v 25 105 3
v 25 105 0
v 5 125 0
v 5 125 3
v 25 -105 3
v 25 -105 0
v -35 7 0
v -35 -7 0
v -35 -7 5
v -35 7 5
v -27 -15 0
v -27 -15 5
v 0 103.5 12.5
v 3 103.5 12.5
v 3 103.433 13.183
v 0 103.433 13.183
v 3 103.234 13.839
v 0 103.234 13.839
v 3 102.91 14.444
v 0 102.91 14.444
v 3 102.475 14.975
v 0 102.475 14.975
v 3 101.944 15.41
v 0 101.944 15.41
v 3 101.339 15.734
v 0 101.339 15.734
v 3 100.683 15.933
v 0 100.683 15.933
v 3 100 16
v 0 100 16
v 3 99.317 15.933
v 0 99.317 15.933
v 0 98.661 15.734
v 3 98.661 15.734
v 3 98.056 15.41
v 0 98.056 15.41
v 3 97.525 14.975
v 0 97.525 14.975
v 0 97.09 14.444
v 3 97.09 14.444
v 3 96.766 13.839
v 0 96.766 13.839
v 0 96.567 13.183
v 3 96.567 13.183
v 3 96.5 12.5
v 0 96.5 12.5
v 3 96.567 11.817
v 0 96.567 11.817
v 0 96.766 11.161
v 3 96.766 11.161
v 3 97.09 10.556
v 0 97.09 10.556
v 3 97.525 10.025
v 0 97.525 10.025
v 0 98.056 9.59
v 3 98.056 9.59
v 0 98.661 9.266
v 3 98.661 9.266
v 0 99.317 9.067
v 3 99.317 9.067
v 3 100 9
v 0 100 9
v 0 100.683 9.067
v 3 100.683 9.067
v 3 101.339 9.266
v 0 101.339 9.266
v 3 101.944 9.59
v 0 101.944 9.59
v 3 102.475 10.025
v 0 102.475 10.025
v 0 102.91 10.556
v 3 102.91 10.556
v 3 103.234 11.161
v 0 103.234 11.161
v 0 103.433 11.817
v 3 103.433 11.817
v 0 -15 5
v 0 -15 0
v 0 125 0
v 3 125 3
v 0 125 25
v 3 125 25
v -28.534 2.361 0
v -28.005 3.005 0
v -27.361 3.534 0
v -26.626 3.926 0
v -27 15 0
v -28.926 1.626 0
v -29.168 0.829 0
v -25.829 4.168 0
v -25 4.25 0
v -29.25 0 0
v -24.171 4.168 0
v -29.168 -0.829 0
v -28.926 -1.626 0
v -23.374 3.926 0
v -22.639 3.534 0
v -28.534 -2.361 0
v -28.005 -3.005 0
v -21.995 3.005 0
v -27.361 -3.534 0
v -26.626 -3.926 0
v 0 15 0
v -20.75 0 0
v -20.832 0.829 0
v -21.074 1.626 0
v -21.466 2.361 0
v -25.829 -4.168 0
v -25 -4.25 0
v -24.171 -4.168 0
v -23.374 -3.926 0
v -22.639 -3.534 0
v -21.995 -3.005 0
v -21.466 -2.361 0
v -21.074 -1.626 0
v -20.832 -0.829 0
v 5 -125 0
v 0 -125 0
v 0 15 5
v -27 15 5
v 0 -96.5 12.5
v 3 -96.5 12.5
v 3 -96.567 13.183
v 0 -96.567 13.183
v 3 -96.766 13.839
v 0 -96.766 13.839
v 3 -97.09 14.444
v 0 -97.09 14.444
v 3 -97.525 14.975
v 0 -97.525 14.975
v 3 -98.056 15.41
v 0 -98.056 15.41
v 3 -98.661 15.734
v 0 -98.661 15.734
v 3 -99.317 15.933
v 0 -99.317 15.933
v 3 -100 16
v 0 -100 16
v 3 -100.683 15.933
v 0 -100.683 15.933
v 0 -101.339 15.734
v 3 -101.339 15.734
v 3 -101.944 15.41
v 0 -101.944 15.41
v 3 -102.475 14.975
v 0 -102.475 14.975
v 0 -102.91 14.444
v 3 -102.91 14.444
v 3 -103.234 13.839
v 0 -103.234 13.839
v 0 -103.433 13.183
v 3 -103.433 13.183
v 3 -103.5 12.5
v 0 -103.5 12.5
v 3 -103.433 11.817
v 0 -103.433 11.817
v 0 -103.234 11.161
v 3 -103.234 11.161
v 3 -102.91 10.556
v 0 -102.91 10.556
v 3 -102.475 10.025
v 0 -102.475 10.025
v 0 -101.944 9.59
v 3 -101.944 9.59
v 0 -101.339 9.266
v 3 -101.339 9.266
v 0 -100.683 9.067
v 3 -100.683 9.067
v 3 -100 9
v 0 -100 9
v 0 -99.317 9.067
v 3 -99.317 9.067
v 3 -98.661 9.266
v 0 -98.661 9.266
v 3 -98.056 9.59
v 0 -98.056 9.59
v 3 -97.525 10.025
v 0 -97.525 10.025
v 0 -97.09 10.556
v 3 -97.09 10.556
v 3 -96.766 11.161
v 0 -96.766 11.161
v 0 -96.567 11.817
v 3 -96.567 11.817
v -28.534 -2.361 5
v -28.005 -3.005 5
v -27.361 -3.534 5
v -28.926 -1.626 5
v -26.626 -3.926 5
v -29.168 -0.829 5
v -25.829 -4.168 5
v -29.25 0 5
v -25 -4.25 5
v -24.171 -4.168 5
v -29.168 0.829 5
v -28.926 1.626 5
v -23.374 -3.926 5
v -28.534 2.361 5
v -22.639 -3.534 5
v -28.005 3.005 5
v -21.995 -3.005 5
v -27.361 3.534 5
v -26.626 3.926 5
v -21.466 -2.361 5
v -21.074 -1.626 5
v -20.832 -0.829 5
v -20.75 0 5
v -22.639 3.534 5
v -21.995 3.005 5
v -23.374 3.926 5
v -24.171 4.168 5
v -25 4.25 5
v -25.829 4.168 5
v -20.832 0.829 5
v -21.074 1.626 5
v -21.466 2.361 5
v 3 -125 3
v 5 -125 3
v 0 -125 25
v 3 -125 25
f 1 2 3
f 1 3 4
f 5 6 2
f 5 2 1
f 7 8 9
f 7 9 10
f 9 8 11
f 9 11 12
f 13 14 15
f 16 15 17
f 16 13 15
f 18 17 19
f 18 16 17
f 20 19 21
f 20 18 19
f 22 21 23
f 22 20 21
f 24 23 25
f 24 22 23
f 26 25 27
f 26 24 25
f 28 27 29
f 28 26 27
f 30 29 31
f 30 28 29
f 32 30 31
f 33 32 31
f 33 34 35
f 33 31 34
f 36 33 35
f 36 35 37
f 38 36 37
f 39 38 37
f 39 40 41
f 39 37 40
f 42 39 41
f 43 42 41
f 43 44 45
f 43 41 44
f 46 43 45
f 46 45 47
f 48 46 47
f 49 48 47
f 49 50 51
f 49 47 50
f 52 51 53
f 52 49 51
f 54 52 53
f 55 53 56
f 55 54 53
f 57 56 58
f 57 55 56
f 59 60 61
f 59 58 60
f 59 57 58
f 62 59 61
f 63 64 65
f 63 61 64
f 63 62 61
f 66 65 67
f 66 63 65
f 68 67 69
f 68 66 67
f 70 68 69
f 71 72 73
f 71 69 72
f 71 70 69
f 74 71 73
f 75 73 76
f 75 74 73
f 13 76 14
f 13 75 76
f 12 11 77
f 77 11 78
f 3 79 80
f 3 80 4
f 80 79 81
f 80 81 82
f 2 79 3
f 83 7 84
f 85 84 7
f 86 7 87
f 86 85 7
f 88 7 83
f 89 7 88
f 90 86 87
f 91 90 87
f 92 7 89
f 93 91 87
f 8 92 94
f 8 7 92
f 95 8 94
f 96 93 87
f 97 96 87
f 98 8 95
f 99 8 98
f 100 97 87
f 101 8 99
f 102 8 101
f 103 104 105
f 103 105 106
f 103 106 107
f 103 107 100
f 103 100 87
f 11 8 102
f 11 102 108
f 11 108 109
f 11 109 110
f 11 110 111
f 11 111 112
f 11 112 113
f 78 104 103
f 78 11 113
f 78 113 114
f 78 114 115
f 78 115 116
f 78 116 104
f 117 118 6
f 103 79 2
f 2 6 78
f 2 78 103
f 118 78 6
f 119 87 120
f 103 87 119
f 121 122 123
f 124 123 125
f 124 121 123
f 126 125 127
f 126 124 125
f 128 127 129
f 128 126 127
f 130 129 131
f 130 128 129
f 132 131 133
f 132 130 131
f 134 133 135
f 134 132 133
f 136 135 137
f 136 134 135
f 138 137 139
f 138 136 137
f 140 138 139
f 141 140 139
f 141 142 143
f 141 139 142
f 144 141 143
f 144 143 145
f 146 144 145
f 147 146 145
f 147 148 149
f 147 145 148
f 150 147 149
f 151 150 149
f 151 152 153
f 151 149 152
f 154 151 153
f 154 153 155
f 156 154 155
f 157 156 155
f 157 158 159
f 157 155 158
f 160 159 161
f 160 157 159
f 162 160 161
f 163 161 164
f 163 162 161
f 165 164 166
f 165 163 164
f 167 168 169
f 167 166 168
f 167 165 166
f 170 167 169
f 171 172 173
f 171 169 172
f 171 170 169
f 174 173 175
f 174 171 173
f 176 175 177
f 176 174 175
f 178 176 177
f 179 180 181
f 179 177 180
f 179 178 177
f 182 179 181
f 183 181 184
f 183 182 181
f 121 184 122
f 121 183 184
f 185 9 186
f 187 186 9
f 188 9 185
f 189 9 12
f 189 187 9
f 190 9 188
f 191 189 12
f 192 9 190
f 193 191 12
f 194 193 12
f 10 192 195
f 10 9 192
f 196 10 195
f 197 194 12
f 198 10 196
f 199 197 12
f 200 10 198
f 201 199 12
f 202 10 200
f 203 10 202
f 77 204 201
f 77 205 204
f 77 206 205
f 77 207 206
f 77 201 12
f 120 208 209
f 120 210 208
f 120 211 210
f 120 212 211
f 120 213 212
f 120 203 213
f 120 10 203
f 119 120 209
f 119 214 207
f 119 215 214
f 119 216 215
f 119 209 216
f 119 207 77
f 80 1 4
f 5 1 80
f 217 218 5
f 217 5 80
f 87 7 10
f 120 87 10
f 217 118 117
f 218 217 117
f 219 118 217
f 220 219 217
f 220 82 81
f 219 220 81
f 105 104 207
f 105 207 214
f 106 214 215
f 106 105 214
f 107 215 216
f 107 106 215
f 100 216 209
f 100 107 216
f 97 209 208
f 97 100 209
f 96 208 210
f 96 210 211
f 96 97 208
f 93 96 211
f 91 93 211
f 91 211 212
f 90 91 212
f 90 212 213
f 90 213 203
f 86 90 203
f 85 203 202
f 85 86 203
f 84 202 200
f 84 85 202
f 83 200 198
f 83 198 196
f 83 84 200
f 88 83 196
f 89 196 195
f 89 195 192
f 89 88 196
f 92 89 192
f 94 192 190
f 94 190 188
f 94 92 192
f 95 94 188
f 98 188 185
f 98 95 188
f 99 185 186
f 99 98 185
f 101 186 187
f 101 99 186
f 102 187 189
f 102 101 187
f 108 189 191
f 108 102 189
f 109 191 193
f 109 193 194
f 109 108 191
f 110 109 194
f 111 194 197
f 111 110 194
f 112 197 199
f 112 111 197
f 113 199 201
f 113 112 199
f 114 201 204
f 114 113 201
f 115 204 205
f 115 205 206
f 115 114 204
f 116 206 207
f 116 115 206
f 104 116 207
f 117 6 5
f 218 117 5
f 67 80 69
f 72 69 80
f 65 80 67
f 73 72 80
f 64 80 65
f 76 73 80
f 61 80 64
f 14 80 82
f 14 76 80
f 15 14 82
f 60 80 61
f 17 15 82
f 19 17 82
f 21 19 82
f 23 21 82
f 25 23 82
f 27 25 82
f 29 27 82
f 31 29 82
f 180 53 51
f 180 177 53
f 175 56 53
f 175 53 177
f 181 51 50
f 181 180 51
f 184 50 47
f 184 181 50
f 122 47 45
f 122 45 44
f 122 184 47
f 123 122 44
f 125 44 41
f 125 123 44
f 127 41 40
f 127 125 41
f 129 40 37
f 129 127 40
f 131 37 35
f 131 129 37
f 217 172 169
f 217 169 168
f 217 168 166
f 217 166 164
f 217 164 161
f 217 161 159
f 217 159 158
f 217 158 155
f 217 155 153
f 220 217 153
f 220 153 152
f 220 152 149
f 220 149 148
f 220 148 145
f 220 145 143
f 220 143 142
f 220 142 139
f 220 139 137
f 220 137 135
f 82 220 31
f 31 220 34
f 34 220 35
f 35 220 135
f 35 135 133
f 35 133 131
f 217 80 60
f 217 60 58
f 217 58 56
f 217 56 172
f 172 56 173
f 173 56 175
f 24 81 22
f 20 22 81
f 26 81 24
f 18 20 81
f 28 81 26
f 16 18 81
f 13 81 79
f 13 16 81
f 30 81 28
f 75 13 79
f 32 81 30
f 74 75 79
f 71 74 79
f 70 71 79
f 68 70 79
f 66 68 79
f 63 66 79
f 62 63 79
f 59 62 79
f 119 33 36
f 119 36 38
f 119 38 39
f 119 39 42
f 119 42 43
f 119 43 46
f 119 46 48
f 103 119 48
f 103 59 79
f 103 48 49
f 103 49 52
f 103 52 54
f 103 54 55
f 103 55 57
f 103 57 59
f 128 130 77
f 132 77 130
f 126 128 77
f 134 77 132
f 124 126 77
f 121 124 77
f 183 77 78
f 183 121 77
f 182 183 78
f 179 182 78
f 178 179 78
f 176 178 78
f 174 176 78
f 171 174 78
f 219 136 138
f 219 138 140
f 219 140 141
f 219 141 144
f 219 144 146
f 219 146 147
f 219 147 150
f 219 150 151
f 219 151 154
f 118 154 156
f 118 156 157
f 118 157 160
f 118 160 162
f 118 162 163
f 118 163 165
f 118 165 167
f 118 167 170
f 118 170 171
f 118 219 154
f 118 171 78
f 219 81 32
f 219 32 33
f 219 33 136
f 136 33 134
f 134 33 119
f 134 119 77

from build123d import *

# Parameters (mm, degrees)
F1_DEPTH = 125
F2_SIZE  = 20
F3_W     = 35
F3_H     = 30
F3_R     = 4.25
F4_DEPTH = 5
F5_SIZE  = 8
F6_R     = 3.5
F7_DEPTH = 25


with BuildPart() as f1:
    # F0 (on Front) → F1 (new body, symmetric)
    with BuildSketch(Plane.XZ):
        Polygon((0, 25), (0, 0), (25, 0), (25, 3), (3, 3), (3, 25), align=None)
    extrude(amount=F1_DEPTH, both=True)

    # F2
    f2_edges = [f1.edges().sort_by_distance(p)[0] for p in [
        (25, -125, 1.5),
        (25, 125, 1.5),
    ]]
    chamfer(f2_edges, length=F2_SIZE)

    # F3 (on Top) → F4 (join)
    with BuildSketch(Plane.XY):
        with Locations((-17.5, 0)):
            Rectangle(F3_W, F3_H)
        with Locations((-25, 0)):
            Circle(F3_R, mode=Mode.SUBTRACT)
    extrude(amount=F4_DEPTH)

    # F5
    f5_edges = [f1.edges().sort_by_distance(p)[0] for p in [
        (-35, -15, 2.5),
        (-35, 15, 2.5),
    ]]
    chamfer(f5_edges, length=F5_SIZE)

    # F6 (on Right) → F7 (cut)
    with BuildSketch(Plane.YZ):
        with Locations((100, 12.5)):
            Circle(F6_R)
        with Locations((-100, 12.5)):
            Circle(F6_R)
    extrude(amount=F7_DEPTH, mode=Mode.SUBTRACT)


solid = f1.part
